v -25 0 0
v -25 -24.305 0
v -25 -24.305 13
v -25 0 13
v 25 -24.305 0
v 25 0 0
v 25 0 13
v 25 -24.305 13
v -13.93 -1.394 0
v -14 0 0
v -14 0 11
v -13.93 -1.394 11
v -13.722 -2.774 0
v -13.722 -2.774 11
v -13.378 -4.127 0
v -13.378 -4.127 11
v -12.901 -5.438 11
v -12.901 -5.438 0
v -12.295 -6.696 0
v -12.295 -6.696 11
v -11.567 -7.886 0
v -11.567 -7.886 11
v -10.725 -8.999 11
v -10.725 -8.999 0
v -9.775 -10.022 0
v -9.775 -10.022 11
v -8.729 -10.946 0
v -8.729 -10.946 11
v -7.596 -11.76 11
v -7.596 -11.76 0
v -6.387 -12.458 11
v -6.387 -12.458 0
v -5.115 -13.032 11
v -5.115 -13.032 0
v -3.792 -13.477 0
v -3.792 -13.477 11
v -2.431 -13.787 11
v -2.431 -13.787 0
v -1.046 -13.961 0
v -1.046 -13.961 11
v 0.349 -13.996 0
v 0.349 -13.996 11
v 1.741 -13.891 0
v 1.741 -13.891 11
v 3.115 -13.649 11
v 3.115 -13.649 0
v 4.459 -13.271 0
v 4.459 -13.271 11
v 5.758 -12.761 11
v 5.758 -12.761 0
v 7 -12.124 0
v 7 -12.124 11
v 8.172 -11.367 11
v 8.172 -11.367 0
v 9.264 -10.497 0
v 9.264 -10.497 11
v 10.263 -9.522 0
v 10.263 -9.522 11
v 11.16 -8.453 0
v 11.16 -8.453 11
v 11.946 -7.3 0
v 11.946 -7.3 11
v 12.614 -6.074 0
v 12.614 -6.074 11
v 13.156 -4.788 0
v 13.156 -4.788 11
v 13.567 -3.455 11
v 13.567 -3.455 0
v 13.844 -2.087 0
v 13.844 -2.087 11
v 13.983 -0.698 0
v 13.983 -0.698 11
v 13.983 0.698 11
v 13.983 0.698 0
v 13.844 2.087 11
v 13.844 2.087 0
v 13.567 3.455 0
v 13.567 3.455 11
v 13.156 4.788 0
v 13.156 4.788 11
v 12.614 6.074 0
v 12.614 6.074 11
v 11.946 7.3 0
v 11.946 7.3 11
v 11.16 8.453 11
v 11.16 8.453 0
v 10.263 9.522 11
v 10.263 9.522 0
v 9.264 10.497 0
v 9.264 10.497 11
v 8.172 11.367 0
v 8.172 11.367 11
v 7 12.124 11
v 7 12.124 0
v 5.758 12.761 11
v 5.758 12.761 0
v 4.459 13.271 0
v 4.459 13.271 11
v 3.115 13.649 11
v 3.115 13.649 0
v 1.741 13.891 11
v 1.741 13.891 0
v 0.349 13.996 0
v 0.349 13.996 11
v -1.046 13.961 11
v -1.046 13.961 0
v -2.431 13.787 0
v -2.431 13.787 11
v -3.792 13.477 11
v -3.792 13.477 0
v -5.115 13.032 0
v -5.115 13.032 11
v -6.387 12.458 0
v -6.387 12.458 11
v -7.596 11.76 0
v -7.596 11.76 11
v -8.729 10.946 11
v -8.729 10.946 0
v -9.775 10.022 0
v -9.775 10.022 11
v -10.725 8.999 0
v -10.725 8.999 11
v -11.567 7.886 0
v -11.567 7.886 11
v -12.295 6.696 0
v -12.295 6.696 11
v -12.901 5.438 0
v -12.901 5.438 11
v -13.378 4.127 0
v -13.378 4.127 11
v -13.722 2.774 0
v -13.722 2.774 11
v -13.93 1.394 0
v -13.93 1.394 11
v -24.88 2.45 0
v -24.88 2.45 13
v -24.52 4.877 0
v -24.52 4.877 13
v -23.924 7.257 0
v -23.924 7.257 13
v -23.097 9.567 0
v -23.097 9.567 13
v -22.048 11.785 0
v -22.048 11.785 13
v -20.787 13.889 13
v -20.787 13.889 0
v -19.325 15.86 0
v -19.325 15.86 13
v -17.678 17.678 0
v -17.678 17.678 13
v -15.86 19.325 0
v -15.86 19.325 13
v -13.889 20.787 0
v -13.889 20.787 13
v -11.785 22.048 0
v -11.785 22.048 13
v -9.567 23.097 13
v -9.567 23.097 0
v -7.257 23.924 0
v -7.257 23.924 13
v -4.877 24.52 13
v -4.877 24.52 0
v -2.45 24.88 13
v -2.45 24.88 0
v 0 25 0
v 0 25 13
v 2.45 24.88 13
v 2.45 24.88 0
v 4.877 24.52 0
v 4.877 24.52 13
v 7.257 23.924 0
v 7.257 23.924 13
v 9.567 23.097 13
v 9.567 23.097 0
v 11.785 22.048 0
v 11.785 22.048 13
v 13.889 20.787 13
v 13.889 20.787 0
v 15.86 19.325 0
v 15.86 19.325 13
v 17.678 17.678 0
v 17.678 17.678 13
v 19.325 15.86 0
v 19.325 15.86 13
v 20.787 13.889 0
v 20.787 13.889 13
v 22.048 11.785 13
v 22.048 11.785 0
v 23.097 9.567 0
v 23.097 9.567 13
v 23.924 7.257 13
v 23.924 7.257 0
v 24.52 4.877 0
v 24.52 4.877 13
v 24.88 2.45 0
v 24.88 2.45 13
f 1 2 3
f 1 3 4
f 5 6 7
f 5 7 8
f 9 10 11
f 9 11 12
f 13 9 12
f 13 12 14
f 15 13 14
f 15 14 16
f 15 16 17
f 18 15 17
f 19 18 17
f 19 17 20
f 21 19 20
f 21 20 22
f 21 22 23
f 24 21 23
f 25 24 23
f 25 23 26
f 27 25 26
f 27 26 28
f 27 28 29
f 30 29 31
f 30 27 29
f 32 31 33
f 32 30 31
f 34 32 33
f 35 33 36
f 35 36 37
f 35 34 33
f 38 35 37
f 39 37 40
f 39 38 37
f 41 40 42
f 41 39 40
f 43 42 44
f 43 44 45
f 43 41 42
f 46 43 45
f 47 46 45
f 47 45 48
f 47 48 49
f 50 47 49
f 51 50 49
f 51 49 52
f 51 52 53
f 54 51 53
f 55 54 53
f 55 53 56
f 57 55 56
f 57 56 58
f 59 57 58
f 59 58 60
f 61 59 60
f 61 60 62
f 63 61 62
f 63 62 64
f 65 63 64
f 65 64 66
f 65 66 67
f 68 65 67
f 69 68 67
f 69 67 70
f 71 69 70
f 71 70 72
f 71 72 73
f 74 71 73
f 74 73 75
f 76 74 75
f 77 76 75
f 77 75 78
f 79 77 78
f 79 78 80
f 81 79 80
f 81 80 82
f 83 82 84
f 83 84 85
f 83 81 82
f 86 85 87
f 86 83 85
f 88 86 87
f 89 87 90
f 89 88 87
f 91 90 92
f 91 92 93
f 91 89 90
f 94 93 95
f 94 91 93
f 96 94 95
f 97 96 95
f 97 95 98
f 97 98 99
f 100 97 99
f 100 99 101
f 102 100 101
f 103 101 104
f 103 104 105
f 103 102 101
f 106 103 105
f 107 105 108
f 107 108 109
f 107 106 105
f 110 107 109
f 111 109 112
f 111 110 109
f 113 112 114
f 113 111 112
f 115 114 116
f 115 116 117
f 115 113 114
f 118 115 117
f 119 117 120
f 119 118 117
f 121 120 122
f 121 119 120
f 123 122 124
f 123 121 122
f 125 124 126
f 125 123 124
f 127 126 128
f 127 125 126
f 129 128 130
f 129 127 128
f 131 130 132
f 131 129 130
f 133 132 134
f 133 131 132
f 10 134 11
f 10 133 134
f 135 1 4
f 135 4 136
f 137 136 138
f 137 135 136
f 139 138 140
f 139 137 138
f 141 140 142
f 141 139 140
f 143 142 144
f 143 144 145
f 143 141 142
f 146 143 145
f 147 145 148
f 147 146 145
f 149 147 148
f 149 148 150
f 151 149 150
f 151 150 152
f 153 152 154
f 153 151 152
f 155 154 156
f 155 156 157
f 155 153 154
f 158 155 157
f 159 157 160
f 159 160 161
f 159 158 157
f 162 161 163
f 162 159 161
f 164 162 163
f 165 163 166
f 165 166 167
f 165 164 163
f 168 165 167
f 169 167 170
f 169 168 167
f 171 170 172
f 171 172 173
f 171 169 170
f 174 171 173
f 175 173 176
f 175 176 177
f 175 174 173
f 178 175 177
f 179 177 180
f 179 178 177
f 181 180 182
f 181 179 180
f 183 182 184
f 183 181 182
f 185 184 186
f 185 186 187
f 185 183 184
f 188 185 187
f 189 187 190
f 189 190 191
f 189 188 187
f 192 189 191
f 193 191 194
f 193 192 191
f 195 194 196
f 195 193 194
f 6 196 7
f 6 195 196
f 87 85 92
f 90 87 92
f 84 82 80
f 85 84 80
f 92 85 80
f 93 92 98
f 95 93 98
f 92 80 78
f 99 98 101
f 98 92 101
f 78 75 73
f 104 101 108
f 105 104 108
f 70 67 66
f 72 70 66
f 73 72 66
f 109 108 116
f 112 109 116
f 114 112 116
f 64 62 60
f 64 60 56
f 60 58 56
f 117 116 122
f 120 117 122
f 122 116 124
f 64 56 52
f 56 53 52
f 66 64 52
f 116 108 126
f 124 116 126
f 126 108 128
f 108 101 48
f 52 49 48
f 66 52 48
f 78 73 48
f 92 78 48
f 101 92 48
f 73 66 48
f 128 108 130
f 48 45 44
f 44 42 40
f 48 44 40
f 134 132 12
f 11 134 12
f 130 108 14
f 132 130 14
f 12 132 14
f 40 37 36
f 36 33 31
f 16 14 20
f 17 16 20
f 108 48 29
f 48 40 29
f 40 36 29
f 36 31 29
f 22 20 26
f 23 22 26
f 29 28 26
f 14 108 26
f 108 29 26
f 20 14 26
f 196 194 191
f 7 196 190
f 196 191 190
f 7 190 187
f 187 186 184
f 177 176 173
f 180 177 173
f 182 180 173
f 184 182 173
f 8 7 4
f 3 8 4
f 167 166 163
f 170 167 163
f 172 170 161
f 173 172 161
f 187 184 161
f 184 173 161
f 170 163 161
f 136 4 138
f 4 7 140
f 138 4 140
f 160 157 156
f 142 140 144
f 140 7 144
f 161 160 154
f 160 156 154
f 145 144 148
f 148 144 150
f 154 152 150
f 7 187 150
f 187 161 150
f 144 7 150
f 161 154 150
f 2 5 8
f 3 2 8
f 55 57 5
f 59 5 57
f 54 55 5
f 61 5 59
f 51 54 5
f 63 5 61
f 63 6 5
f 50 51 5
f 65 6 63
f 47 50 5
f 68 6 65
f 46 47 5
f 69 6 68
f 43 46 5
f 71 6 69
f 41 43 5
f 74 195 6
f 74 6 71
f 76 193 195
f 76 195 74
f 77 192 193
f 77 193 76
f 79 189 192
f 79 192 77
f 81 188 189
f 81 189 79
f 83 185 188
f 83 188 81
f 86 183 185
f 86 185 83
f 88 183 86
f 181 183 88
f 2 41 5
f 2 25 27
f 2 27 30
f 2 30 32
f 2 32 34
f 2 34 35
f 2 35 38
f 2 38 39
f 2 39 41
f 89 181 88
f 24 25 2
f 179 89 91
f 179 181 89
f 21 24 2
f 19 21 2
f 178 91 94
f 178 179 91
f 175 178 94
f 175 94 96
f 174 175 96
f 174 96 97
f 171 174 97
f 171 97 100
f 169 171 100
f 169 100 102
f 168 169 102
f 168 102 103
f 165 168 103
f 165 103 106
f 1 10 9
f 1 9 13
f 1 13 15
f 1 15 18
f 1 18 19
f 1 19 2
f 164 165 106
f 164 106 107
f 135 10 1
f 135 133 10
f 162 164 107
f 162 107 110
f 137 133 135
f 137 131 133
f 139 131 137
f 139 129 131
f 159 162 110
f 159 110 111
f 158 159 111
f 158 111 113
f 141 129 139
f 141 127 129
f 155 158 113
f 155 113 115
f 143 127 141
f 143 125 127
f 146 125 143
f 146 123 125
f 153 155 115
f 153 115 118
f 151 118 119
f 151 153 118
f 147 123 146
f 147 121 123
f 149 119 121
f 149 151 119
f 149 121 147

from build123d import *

# Parameters (mm, degrees)
ESQUISSE1_R             = 14
BOSS_EXTRU_1_DEPTH      = 13
BOSS_EXTRU_2_START      = -2
ESQUISSE3_R             = 14
BOSS_EXTRU_2_DEPTH      = 2
ESQUISSE4_W             = 13
ESQUISSE4_H             = 10.015892944
ENL_V_MAT_EXTRU_1_DEPTH = 60


with BuildPart() as part:
    # Esquisse1 → Boss.-Extru.1 (new body)
    with BuildSketch(Plane.XY):
        with BuildLine():
            ThreePointArc((-25, 0), (0, 25), (25, 0))
            Line((25, 0), (25, -32.475372295))
            Line((25, -32.475372295), (-25, -32.475372295))
            Line((-25, -32.475372295), (-25, 0))
        make_face()
        with Locations(Location((0, 0, 0), (0, 0, 180))):
            Circle(ESQUISSE1_R, mode=Mode.SUBTRACT)
    extrude(amount=BOSS_EXTRU_1_DEPTH)

    # Esquisse3 → Boss.-Extru.2 (add)
    with BuildSketch(Plane.XY.offset(13).offset(BOSS_EXTRU_2_START)):
        with Locations(Location((0, 0, 0), (0, 0, 180))):
            Circle(ESQUISSE3_R)
    extrude(amount=BOSS_EXTRU_2_DEPTH)

    # Esquisse4 → Enlèv. mat.-Extru.1 (cut)
    with BuildSketch(Plane.ZY.offset(25)):
        with Locations((6.5, -29.313318767)):
            Rectangle(ESQUISSE4_W, ESQUISSE4_H)
    extrude(amount=-ENL_V_MAT_EXTRU_1_DEPTH, mode=Mode.SUBTRACT)


solid = part.part
